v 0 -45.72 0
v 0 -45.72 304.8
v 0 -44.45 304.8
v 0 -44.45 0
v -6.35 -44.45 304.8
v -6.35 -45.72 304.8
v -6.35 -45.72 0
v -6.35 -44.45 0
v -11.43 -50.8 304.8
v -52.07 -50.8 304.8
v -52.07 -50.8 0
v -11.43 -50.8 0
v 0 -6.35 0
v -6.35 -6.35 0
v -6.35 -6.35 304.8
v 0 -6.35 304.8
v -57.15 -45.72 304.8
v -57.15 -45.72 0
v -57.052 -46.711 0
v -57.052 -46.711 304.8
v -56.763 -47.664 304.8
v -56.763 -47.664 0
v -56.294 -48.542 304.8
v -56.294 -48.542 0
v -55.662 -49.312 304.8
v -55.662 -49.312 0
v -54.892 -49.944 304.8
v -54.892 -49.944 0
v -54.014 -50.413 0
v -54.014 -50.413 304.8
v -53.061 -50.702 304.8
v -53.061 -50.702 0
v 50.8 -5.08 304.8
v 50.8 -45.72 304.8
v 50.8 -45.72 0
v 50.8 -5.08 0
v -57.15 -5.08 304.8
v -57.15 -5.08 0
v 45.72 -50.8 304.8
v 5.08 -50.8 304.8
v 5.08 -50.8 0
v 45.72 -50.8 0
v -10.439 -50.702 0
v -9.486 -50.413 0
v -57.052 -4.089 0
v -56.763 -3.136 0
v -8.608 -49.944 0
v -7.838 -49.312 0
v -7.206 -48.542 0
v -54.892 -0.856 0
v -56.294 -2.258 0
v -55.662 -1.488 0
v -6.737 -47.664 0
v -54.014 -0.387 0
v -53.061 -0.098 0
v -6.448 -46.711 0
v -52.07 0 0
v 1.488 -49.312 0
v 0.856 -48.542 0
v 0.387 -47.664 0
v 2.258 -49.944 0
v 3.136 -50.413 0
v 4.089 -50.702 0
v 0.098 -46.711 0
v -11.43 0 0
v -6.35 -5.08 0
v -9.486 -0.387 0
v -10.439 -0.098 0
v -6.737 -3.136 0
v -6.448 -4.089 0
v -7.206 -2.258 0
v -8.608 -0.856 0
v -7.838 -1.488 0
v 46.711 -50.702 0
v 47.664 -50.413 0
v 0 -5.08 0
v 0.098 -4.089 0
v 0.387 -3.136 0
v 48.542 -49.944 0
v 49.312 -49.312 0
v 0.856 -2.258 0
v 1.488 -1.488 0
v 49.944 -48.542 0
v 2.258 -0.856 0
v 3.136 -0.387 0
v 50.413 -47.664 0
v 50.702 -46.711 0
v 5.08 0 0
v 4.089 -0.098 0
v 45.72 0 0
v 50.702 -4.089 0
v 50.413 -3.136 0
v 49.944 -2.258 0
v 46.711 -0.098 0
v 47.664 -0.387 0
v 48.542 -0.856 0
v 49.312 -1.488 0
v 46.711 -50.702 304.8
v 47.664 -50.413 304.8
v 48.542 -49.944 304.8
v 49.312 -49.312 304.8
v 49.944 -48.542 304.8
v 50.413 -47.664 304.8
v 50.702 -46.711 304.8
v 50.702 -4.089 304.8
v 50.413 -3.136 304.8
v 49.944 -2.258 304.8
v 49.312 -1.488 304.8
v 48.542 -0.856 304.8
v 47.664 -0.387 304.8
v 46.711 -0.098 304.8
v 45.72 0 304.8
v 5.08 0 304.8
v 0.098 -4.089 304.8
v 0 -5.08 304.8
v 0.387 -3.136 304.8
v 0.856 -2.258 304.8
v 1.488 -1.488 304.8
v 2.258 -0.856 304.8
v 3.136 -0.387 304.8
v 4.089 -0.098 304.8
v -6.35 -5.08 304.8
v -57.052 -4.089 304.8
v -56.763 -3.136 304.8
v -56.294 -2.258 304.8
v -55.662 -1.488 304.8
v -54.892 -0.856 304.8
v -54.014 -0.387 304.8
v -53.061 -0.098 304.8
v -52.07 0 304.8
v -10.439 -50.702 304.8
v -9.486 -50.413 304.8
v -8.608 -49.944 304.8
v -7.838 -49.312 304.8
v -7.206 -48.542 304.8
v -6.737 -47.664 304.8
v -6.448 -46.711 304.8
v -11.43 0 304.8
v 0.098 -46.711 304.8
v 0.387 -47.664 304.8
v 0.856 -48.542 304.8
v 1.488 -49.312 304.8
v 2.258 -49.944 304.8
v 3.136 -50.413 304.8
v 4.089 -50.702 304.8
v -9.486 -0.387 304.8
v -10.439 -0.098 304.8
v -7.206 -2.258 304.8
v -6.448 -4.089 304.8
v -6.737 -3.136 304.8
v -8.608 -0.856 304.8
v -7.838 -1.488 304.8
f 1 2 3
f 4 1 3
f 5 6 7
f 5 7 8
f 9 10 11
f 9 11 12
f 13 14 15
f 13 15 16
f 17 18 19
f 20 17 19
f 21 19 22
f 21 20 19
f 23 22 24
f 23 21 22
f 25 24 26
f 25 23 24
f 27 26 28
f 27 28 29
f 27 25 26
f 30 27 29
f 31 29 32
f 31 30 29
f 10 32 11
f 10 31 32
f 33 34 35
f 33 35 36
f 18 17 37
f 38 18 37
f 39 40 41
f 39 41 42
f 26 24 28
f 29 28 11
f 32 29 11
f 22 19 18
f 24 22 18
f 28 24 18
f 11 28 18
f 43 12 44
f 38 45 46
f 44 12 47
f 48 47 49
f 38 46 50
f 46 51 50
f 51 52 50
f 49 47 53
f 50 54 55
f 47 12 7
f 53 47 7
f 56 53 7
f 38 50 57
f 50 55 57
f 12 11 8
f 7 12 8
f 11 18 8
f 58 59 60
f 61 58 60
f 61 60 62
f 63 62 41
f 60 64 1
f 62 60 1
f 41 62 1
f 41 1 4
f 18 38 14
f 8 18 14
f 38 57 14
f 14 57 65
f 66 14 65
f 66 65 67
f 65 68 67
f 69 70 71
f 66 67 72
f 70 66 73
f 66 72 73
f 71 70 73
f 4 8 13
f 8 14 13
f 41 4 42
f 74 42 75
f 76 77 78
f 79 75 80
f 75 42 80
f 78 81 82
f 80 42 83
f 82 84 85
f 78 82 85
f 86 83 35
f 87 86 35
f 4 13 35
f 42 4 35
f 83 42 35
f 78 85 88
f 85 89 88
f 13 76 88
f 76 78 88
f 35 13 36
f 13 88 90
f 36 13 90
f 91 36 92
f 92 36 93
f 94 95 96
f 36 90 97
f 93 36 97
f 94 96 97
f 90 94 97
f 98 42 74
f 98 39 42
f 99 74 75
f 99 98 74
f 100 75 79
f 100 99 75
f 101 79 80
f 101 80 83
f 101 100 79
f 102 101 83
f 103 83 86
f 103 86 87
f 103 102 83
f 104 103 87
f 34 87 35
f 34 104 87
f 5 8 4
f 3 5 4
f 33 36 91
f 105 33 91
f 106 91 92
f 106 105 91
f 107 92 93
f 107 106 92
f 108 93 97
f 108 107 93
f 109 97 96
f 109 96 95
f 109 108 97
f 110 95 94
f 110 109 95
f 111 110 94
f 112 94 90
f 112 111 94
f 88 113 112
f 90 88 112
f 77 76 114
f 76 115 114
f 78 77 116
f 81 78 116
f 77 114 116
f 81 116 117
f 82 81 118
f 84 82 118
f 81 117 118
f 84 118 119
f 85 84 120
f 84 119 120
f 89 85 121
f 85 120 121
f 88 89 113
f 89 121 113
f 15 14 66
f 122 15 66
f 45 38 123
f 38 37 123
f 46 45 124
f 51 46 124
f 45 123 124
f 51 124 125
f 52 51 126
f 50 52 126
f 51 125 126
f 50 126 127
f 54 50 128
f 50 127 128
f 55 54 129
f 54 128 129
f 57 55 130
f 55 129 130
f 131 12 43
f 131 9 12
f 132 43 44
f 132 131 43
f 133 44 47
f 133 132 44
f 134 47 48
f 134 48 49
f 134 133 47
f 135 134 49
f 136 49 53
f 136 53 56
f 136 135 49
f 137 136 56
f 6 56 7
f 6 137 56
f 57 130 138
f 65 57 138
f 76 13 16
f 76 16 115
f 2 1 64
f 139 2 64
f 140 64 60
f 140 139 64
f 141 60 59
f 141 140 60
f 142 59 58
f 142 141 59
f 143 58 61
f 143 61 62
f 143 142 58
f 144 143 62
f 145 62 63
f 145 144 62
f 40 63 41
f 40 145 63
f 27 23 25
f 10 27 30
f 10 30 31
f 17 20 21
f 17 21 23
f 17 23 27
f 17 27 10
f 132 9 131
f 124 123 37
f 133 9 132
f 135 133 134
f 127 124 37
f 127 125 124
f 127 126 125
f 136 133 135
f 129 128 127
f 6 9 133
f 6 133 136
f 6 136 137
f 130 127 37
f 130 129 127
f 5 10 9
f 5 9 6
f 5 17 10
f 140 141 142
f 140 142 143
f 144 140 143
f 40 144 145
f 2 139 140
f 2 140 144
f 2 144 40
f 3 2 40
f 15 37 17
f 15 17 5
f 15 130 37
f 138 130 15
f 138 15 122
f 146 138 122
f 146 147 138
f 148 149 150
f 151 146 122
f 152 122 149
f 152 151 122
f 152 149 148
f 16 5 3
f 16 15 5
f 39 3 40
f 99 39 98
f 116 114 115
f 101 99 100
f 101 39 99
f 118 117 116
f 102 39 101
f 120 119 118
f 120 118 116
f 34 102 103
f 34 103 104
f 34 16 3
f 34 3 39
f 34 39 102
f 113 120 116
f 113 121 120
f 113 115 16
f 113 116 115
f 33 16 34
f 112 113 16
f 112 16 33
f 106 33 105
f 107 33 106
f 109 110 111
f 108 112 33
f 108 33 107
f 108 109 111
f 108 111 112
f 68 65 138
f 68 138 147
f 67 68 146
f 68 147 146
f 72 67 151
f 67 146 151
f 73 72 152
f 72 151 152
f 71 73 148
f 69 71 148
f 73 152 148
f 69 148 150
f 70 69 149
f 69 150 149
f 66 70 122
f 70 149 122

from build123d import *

# Parameters (mm, degrees)
F0_W     = 50.8
F0_H     = 50.8
F1_DEPTH = 304.8
F2_R     = 5.08
F3_W     = 6.35
F3_H     = 38.1
F4_DEPTH = 304.8
F5_W     = 50.8
F5_H     = 50.8
F6_DEPTH = 304.8
F7_R     = 5.08


with BuildPart() as f1:
    # F0 (on Top) → F1 (new body)
    with BuildSketch(Plane.XY):
        with Locations((25.4, -25.4)):
            Rectangle(F0_W, F0_H)
    extrude(amount=F1_DEPTH)

    # F2
    f2_edges = [f1.edges().sort_by_distance(p)[0] for p in [
        (0, -50.8, 152.4),
        (50.8, -50.8, 152.4),
        (50.8, 0, 152.4),
        (0, 0, 152.4),
    ]]
    fillet(f2_edges, radius=F2_R)

    # F3 (on Top) → F4 (join)
    with BuildSketch(Plane.XY):
        with Locations((-3.175, -25.4)):
            Rectangle(F3_W, F3_H)
    extrude(amount=F4_DEPTH)

    # F5 (on Top) → F6 (join)
    with BuildSketch(Plane.XY):
        with Locations((-31.75, -25.4)):
            Rectangle(F5_W, F5_H)
    extrude(amount=F6_DEPTH)

    # F7
    f7_edges = [f1.edges().sort_by_distance(p)[0] for p in [
        (-57.15, -50.8, 152.4),
        (-6.35, -50.8, 152.4),
        (-57.15, 0, 152.4),
        (-6.35, 0, 152.4),
    ]]
    fillet(f7_edges, radius=F7_R)


solid = f1.part
